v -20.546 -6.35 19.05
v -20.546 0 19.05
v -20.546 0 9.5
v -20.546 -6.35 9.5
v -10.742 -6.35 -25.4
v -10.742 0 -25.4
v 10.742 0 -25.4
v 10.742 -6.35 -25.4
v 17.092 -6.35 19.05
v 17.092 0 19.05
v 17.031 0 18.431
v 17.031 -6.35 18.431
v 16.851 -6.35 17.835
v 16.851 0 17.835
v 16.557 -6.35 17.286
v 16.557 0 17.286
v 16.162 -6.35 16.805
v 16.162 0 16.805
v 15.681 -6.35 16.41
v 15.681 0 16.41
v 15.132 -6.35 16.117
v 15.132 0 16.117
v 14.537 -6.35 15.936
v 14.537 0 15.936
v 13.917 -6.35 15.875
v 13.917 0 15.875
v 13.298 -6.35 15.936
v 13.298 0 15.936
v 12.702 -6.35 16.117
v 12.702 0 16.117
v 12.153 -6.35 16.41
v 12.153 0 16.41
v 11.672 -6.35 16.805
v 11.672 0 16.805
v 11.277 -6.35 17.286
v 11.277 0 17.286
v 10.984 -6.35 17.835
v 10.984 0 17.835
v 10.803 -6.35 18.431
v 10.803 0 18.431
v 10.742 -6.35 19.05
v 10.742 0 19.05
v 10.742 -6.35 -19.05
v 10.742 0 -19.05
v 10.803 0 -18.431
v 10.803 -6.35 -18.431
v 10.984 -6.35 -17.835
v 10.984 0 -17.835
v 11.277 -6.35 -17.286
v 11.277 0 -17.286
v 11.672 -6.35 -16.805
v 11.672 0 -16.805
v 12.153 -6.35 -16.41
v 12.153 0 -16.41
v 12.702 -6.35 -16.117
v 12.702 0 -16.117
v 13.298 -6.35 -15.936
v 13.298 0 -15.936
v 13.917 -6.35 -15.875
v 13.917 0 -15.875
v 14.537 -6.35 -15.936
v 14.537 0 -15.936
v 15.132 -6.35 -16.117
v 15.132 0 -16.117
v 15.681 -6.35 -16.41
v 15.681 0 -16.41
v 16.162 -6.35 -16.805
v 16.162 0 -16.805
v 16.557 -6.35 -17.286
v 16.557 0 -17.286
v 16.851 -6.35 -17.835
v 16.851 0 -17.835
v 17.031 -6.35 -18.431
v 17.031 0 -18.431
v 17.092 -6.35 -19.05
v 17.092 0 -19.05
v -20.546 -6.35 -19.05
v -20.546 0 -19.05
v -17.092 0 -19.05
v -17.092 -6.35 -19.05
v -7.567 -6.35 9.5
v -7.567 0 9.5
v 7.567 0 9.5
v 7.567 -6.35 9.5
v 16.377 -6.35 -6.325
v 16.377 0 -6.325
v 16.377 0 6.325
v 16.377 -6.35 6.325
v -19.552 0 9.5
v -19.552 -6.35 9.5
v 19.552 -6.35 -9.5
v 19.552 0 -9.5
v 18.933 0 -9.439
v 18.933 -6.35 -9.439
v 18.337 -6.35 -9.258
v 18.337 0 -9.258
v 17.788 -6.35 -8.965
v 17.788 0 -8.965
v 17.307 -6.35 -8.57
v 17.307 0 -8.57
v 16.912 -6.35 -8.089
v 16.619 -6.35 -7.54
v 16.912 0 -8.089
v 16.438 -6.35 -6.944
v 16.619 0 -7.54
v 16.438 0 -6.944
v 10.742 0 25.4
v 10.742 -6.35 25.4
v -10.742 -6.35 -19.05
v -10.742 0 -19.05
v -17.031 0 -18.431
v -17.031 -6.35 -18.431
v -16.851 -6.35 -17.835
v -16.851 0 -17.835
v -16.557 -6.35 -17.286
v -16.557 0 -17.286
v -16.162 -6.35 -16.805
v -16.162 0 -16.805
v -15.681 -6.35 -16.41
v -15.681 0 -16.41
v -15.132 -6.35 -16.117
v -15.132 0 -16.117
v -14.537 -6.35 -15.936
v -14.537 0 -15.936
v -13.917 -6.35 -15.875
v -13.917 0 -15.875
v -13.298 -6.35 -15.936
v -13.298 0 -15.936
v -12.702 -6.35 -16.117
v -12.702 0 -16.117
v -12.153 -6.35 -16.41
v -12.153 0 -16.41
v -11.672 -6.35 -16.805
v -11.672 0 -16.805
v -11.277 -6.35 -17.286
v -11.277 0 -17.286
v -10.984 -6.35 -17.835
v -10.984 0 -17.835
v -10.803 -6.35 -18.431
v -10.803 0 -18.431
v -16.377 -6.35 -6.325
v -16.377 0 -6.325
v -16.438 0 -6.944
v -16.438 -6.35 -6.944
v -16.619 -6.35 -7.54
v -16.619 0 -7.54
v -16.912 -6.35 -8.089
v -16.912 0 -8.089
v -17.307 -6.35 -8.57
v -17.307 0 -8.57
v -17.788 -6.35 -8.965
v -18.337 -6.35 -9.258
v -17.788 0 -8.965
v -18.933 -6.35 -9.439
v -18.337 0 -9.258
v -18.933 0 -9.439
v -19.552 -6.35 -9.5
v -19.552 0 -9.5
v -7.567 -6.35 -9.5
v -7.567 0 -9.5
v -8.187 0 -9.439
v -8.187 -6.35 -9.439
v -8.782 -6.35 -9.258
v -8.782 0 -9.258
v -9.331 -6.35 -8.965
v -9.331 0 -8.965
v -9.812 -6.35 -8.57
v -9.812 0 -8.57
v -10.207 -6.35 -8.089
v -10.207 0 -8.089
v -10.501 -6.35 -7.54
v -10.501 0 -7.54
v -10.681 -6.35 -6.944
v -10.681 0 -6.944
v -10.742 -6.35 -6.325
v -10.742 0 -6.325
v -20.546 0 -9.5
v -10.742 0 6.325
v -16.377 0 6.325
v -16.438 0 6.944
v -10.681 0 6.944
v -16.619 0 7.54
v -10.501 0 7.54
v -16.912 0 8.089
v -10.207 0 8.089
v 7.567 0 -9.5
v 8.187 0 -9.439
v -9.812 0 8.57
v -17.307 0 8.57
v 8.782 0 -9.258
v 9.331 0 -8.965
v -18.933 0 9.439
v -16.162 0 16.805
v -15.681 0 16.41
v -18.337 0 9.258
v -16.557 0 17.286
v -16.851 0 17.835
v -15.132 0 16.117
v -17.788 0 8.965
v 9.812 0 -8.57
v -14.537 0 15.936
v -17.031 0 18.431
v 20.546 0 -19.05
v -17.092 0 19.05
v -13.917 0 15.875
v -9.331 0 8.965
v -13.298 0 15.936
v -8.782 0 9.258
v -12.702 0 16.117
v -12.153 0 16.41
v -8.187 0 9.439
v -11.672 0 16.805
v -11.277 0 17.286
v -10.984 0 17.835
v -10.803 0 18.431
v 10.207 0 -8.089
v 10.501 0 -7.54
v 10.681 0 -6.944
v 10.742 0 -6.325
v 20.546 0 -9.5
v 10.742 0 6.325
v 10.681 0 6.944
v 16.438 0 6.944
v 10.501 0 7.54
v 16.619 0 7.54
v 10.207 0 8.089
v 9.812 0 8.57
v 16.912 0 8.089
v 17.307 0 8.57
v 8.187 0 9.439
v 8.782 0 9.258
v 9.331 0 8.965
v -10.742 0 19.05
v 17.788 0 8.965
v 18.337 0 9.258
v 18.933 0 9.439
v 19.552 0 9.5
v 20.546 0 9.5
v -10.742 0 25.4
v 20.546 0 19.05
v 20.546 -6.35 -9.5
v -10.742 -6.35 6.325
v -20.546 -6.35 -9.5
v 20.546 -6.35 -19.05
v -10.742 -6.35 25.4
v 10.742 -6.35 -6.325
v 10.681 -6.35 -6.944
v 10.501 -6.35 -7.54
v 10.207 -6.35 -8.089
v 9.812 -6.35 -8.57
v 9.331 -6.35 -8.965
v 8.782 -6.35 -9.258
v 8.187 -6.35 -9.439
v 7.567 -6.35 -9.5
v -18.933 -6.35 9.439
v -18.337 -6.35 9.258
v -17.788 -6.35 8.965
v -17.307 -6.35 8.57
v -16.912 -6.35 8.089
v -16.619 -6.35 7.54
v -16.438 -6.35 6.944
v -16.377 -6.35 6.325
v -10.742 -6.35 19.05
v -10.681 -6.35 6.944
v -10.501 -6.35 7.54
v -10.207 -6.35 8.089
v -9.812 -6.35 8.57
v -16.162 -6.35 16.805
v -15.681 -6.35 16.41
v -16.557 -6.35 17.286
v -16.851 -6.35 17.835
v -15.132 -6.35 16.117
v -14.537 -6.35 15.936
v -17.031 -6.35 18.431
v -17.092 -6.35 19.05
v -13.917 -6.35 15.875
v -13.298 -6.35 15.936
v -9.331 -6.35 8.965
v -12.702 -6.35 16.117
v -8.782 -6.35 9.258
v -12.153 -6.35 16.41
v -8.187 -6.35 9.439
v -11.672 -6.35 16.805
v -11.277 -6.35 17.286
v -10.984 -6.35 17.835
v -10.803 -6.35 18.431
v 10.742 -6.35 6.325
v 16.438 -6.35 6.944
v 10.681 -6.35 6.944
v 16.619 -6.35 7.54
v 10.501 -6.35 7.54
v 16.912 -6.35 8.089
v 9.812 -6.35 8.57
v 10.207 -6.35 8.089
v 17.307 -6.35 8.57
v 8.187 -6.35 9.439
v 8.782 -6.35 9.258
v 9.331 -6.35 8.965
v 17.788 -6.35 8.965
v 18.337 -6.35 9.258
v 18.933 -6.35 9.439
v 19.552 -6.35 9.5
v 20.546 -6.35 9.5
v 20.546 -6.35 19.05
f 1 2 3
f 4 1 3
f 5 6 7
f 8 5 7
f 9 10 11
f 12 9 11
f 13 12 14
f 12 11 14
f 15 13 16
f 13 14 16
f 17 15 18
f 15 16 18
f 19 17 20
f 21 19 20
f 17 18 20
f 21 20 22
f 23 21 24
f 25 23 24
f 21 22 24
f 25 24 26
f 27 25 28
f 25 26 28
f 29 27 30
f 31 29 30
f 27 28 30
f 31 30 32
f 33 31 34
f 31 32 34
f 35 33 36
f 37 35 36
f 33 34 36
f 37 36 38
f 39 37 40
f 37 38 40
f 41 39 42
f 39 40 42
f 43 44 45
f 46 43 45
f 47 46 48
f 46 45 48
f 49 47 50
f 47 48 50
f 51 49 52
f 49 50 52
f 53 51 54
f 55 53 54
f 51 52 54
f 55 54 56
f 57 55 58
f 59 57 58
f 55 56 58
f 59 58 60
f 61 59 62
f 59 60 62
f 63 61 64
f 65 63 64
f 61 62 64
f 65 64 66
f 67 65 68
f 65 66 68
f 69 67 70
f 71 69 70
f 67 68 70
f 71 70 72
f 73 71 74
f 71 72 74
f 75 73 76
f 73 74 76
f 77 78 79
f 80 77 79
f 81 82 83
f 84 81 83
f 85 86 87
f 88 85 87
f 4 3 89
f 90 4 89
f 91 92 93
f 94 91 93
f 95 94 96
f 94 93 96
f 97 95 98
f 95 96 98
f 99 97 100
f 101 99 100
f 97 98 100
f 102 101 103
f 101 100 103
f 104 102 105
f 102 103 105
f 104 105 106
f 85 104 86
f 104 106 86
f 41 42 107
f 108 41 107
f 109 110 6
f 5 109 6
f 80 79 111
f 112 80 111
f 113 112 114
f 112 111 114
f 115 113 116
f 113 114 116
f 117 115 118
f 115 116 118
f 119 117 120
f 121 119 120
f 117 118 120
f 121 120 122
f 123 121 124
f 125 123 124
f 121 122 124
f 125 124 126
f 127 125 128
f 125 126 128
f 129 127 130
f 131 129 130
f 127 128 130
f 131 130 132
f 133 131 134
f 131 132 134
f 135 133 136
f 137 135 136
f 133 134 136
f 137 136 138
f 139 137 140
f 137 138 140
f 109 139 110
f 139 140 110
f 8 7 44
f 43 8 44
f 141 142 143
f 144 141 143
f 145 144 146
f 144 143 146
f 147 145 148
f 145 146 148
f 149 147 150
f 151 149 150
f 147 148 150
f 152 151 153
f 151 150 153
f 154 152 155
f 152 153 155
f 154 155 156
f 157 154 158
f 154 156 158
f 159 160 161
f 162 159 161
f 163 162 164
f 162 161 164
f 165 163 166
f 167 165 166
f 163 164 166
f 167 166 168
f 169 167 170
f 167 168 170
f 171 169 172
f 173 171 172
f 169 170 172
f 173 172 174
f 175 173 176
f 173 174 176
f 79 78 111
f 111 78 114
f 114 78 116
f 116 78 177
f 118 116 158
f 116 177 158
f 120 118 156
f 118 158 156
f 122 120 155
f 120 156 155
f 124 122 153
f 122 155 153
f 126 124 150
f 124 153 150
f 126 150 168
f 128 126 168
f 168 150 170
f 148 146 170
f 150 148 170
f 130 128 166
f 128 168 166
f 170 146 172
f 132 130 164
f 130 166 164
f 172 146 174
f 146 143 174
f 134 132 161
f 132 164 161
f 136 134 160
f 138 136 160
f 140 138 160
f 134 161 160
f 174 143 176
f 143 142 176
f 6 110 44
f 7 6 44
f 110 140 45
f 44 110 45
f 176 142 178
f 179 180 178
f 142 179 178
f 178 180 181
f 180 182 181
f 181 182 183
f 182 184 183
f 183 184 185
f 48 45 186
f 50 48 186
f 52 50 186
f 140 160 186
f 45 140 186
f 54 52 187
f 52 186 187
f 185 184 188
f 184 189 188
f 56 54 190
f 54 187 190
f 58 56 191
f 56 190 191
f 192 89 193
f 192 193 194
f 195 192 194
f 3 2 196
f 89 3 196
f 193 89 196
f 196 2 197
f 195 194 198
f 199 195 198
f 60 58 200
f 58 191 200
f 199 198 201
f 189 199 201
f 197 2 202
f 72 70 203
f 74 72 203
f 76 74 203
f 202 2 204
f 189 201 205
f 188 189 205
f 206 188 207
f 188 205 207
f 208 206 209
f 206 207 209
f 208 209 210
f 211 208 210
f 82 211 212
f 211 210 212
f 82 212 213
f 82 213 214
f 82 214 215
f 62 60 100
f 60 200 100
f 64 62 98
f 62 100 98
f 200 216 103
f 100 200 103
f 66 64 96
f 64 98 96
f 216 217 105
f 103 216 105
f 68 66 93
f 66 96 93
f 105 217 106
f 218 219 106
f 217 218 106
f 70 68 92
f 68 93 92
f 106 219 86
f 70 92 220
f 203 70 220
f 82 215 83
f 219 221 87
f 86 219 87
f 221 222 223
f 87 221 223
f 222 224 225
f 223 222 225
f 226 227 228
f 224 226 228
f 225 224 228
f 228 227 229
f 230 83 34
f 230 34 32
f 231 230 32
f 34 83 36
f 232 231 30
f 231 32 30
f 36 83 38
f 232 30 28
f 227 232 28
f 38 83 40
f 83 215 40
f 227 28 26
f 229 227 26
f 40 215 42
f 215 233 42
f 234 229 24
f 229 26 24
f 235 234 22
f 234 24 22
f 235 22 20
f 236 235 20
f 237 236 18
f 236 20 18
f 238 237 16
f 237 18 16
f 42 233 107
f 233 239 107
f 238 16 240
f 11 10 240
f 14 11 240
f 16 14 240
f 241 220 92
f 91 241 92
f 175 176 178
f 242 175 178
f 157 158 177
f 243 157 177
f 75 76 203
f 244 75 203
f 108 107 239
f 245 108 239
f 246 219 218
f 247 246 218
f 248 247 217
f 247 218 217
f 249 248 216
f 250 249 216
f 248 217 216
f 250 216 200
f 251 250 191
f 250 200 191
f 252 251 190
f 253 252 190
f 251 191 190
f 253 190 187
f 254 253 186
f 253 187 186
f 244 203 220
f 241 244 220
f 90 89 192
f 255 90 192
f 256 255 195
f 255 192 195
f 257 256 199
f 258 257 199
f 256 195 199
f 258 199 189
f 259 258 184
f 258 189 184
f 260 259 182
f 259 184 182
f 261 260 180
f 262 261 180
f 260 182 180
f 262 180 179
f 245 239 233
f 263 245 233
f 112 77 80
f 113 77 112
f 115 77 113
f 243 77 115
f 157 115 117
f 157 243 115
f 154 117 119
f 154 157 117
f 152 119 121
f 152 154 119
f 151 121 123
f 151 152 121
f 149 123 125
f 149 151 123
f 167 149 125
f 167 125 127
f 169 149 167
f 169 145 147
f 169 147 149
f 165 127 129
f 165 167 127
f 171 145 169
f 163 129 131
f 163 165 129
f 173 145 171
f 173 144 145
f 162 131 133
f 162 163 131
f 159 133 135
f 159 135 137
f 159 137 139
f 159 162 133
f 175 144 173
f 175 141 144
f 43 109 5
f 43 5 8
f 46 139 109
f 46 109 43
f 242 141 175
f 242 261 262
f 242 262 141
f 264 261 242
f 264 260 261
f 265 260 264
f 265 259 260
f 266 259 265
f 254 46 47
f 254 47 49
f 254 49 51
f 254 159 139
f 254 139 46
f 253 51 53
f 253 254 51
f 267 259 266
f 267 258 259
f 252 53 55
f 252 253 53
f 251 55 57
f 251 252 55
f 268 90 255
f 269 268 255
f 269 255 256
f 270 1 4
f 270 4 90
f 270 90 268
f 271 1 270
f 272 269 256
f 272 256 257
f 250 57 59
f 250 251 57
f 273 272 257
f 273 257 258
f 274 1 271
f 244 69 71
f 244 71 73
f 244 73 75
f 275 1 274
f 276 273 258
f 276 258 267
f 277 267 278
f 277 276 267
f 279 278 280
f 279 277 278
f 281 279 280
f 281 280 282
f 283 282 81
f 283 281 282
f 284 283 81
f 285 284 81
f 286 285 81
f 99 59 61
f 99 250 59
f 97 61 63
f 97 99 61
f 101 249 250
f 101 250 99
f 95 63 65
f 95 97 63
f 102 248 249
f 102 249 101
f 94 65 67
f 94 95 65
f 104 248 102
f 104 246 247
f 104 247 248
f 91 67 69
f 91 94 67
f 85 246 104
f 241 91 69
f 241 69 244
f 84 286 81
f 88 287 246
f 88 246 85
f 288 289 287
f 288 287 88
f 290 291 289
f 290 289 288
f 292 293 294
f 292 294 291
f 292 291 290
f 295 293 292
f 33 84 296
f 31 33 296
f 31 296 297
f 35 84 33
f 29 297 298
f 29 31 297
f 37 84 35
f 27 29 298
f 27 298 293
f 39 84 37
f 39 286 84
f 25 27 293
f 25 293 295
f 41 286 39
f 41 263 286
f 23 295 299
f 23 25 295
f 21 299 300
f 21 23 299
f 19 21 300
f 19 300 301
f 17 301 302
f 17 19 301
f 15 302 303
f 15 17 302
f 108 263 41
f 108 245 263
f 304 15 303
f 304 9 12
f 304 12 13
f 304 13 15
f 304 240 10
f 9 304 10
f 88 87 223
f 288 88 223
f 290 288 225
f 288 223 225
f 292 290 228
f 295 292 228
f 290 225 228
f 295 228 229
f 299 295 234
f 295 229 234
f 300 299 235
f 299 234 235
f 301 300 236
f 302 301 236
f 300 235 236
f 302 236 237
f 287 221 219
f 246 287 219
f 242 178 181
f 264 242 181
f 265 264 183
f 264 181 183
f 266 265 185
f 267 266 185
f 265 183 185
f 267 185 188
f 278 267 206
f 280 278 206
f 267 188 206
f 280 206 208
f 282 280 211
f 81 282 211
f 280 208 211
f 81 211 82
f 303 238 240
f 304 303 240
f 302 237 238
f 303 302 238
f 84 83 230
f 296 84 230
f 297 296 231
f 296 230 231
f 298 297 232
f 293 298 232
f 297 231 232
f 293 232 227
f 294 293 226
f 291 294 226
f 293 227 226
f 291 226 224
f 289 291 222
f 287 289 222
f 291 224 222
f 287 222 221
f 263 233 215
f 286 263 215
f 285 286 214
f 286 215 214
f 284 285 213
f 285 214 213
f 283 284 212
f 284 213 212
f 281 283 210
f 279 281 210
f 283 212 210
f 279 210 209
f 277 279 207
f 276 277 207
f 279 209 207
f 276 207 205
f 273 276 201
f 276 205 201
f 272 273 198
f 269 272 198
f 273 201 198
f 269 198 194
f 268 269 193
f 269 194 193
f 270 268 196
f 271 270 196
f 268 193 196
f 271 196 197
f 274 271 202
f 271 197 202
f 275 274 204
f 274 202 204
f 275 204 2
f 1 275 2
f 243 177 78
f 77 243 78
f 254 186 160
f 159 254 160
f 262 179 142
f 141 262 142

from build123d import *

# Parameters (mm, degrees)
F1_DEPTH = 6.35


# Not quite as in the source:
# - ends of sketch curves that miss each other by under 0.0002 mm in the source are joined


with BuildPart() as f1:
    # F0 (on Front) → F1 (new body)
    with BuildSketch(Plane.XZ):
        with BuildLine():
            ThreePointArc((10.7423712, -19.0500001571), (13.9173712, -15.8750001571), (17.0923712, -19.0500001571))
            Line((17.0923712, -19.0500001571), (20.545679, -19.0500001571))
            Line((20.545679, -19.0500001571), (20.545679, -9.4996001571))
            Line((20.545679, -9.4996001571), (19.5523612, -9.4996001571))
            ThreePointArc((19.5523612, -9.4996001571), (17.3072971697, -8.5696641874), (16.3773612, -6.3246001571))
            Line((16.3773612, -6.3246001571), (16.3773612, 6.3245998429))
            ThreePointArc((16.3773612, 6.3245998429), (17.3072971697, 8.5696638731), (19.5523612, 9.4995998429))
            Line((19.5523612, 9.4995998429), (20.545679, 9.4995998429))
            Line((20.545679, 9.4995998429), (20.545679, 19.0499998429))
            Line((20.545679, 19.0499998429), (17.0923712, 19.0499998429))
            ThreePointArc((17.0923712, 19.0499998429), (13.9173712, 15.8749998429), (10.7423712, 19.0499998429))
            Line((10.7423712, 19.0499998429), (10.7423712, 25.3999998429))
            Line((10.7423712, 25.3999998429), (-10.7423712, 25.3999998429))
            Line((-10.7423712, 25.3999998429), (-10.7423712, 19.0499998429))
            ThreePointArc((-10.7423712, 19.0499998429), (-13.9173712, 15.8749998429), (-17.0923712, 19.0499998429))
            Line((-17.0923712, 19.0499998429), (-20.545679, 19.0499998429))
            Line((-20.545679, 19.0499998429), (-20.545679, 9.4995998429))
            Line((-20.545679, 9.4995998429), (-19.5523612, 9.4995998429))
            ThreePointArc((-19.5523612, 9.4995998429), (-17.3072971697, 8.5696638731), (-16.3773612, 6.3245998429))
            Line((-16.3773612, 6.3245998429), (-16.3773612, -6.3246001571))
            ThreePointArc((-16.3773612, -6.3246001571), (-17.3072971697, -8.5696641874), (-19.5523612, -9.4996001571))
            Line((-19.5523612, -9.4996001571), (-20.545679, -9.4996001571))
            Line((-20.545679, -9.4996001571), (-20.545679, -19.0500001571))
            Line((-20.545679, -19.0500001571), (-17.0923712, -19.0500001571))
            ThreePointArc((-17.0923712, -19.0500001571), (-13.9173712, -15.8750001571), (-10.7423712, -19.0500001571))
            Line((-10.7423712, -19.0500001571), (-10.7423712, -25.3999747571))
            Line((-10.7423712, -25.3999747571), (10.7423712, -25.3999747571))
            Line((10.7423712, -25.3999747571), (10.7423712, -19.0500001571))
        make_face()
        with BuildLine():
            Line((-7.5673712, 9.4996252429), (7.5673712, 9.4996252429))
            ThreePointArc((7.5673712, 9.4996252429), (9.8124352303, 8.5696638731), (10.7423712, 6.3245998429))
            Line((10.7423712, 6.3245998429), (10.7423712, -6.3246001571))
            ThreePointArc((10.7423712, -6.3246001571), (9.8124352303, -8.5696641874), (7.5673712, -9.4996001571))
            Line((7.5673712, -9.4996001571), (-7.5673712, -9.4996001571))
            ThreePointArc((-7.5673712, -9.4996001571), (-9.8124352303, -8.5696641874), (-10.7423712, -6.3246001571))
            Line((-10.7423712, -6.3246001571), (-10.7423712, 6.3245998429))
            ThreePointArc((-10.7423712, 6.3245998429), (-9.8124352303, 8.5696638731), (-7.5673712, 9.4996252429))
        make_face(mode=Mode.SUBTRACT)
    extrude(amount=F1_DEPTH)


solid = f1.part
